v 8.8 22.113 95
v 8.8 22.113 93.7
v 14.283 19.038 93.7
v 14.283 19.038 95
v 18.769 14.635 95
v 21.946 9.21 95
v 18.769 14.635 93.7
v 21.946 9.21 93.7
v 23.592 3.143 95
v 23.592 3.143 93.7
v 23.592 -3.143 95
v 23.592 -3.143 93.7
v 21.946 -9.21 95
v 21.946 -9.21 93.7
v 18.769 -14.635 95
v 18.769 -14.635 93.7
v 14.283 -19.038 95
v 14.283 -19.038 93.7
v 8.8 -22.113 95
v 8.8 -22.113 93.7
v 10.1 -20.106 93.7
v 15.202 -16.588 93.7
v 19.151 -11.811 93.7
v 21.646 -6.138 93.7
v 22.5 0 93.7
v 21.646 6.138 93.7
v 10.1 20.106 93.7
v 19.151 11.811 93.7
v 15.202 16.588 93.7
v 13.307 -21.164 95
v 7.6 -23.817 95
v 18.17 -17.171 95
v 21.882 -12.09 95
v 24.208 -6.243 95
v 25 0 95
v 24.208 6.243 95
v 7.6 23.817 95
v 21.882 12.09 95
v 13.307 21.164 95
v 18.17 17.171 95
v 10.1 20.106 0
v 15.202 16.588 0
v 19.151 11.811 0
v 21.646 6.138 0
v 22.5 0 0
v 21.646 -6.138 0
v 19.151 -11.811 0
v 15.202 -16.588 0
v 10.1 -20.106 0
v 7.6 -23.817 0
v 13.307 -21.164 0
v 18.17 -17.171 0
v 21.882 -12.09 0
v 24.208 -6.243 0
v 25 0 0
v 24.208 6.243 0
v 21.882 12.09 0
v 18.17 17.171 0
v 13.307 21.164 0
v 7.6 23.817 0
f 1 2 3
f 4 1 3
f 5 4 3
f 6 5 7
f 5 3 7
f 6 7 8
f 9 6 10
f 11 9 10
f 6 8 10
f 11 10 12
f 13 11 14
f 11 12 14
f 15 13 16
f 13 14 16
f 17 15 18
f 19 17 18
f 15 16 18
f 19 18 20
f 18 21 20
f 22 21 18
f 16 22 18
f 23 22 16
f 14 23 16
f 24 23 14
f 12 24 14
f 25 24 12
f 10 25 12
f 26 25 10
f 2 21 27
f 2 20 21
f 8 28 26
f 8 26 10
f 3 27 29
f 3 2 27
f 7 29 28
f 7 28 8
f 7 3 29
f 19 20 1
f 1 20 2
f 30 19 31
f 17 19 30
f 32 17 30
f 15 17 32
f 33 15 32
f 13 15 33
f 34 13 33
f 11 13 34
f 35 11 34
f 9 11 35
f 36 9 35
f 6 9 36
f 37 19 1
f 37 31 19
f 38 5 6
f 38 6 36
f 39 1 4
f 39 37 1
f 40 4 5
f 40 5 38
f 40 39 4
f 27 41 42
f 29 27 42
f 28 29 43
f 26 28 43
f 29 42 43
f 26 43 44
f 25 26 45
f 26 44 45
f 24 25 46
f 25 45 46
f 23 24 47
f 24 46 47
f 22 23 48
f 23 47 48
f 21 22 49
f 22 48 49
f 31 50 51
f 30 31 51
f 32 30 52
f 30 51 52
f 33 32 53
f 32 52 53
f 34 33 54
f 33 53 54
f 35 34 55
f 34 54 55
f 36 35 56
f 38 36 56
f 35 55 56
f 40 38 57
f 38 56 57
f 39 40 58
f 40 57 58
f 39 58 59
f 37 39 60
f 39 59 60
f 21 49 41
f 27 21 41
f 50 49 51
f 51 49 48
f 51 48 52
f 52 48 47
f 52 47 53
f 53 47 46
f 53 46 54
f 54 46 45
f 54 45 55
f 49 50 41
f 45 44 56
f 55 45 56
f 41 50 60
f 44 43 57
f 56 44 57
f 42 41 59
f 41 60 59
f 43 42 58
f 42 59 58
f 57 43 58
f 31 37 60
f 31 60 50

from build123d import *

# Parameters (mm, degrees)
F1_DEPTH = 95
F2_DEPTH = 93.7


with BuildPart() as f1:
    # F0 (on Top) → F1 (new body)
    with BuildSketch(Plane.XY):
        with BuildLine():
            Line((7.6, -21.177582), (7.6, -23.816801))
            ThreePointArc((7.6, -23.816801), (25, 0), (7.6, 23.816801))
            Line((7.6, 23.816801), (7.6, 21.177582))
            Line((7.6, 21.177582), (7.6, -21.177582))
        make_face()
        with BuildLine():
            ThreePointArc((8.8, 22.113344), (23.8, 0), (8.8, -22.113344))
            Line((8.8, -22.113344), (8.8, 22.113344))
        make_face(mode=Mode.SUBTRACT)
    extrude(amount=F1_DEPTH)

    # F0 (on Top) → F2 (join)
    with BuildSketch(Plane.XY):
        with BuildLine():
            Line((8.8, 22.113344), (8.8, -22.113344))
            ThreePointArc((8.8, -22.113344), (23.8, 0), (8.8, 22.113344))
        make_face()
        with BuildLine():
            ThreePointArc((10.1, 20.105721), (22.5, 0), (10.1, -20.105721))
            Line((10.1, -20.105721), (10.1, 20.105721))
        make_face(mode=Mode.SUBTRACT)
    extrude(amount=F2_DEPTH)


solid = f1.part
